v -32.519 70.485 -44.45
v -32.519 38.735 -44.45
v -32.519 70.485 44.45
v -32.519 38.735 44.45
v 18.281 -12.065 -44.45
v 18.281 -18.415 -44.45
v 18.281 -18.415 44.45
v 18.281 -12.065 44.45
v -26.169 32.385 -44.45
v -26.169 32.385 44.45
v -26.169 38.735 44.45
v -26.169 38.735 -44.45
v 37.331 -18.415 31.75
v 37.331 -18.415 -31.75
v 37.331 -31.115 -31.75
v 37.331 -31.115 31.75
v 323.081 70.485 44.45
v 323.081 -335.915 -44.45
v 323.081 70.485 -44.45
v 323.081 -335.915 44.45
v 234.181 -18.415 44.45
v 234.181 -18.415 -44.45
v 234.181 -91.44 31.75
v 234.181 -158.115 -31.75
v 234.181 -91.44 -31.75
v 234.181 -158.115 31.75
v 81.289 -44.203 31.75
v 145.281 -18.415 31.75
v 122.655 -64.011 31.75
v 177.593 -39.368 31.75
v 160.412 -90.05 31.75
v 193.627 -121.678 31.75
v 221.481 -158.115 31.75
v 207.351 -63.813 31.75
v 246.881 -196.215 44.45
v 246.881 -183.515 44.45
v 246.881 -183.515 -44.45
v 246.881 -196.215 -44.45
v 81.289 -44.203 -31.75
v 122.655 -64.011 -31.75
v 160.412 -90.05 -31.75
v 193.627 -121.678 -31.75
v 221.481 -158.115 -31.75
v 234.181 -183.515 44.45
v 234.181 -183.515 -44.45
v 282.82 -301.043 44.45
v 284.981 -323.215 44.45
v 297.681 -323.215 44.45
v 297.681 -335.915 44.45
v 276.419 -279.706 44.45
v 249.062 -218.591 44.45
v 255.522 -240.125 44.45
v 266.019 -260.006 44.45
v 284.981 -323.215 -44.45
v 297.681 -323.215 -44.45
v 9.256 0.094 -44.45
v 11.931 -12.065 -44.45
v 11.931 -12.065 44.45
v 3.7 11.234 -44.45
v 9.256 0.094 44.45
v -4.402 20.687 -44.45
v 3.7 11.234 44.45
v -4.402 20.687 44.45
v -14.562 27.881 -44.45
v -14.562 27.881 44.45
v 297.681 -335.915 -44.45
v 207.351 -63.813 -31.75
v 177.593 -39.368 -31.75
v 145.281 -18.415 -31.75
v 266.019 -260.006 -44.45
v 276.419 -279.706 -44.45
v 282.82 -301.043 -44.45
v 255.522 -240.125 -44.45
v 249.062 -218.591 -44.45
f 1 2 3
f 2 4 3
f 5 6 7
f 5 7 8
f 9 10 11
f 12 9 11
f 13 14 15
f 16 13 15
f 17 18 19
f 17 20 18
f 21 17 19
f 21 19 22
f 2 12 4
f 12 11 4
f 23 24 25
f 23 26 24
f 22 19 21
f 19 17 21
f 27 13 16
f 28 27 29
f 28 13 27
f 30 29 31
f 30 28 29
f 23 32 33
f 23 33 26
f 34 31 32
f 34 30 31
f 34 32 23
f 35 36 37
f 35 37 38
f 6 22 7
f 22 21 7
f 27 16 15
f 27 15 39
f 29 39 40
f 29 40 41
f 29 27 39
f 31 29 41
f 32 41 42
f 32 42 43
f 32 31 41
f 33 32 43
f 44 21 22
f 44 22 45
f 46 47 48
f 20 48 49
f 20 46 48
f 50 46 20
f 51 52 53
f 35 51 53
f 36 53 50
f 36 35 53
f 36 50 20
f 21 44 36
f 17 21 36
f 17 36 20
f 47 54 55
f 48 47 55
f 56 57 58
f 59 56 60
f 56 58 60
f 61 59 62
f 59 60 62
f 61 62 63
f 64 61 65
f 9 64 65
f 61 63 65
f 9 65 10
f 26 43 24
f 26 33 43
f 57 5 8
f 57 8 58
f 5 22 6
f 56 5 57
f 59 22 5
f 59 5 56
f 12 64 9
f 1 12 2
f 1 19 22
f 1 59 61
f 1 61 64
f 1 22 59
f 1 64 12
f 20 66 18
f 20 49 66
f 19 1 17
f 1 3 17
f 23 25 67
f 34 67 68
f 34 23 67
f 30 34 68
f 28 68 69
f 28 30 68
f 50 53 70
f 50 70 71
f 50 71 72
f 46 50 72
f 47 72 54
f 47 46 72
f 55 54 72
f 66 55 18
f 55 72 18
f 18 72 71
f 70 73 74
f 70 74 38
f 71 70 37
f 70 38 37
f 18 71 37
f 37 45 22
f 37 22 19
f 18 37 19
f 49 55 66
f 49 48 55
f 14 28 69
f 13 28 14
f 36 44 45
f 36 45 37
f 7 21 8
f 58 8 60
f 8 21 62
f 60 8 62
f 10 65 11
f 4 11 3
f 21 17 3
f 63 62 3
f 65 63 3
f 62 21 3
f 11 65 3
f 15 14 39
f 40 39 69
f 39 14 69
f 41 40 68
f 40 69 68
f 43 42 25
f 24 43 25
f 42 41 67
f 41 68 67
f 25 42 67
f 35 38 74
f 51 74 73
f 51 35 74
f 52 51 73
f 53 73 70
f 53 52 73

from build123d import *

# Parameters (mm, degrees)
BOSS_EXTRUDE1_DEPTH = 44.45
BOSS_EXTRUDE2_DEPTH = 31.75
BOSS_EXTRUDE3_DEPTH = 44.45


with BuildPart() as part:
    # Sketch1 → Boss-Extrude1 (new body, symmetric)
    with BuildSketch(Plane.XY):
        with BuildLine():
            Line((-26.168776984, 32.385), (-26.168776984, 38.735))
            Line((-26.168776984, 38.735), (-32.518776984, 38.735))
            Line((-32.518776984, 38.735), (-32.518776984, 70.485))
            Line((-32.518776984, 70.485), (323.081223016, 70.485))
            Line((323.081223016, 70.485), (234.181223016, -18.415))
            Line((234.181223016, -18.415), (18.281223016, -18.415))
            Line((18.281223016, -18.415), (18.281223016, -12.065))
            Line((18.281223016, -12.065), (11.931223016, -12.065))
            ThreePointArc((11.931223016, -12.065), (-0.060423906, 16.210016924), (-26.168776984, 32.385))
        make_face()
    extrude(amount=BOSS_EXTRUDE1_DEPTH, both=True)


with BuildPart() as body_2:
    # Sketch1_3 → Boss-Extrude2 (new body, symmetric)
    with BuildSketch(Plane.XY):
        with BuildLine():
            ThreePointArc((234.181223016, -91.44), (192.815678027, -51.17251129), (145.281223016, -18.415))
            Line((145.281223016, -18.415), (37.331223016, -18.415))
            Line((37.331223016, -18.415), (37.331223016, -31.115))
            ThreePointArc((37.331223016, -31.115), (142.045295922, -76.288344286), (221.481223016, -158.115))
            Line((221.481223016, -158.115), (234.181223016, -158.115))
            Line((234.181223016, -158.115), (234.181223016, -91.44))
        make_face()
    extrude(amount=BOSS_EXTRUDE2_DEPTH, both=True)


with BuildPart() as body_3:
    # Sketch1_4 → Boss-Extrude3 (new body, symmetric)
    with BuildSketch(Plane.XY):
        with BuildLine():
            Line((323.081223016, -335.915), (323.081223016, 70.485))
            Line((323.081223016, 70.485), (234.181223016, -18.415))
            Line((234.181223016, -18.415), (234.181223016, -183.515))
            Line((234.181223016, -183.515), (246.881223016, -183.515))
            Line((246.881223016, -183.515), (246.881223016, -196.215))
            ThreePointArc((246.881223016, -196.215), (251.768629387, -229.515028089), (266.018608337, -260.006284404))
            ThreePointArc((266.018608337, -260.006284404), (280.138450492, -290.219081757), (284.981223016, -323.215))
            Line((284.981223016, -323.215), (297.681223016, -323.215))
            Line((297.681223016, -323.215), (297.681223016, -335.915))
            Line((297.681223016, -335.915), (323.081223016, -335.915))
        make_face()
    extrude(amount=BOSS_EXTRUDE3_DEPTH, both=True)


solid = Compound([part.part, body_2.part, body_3.part])
